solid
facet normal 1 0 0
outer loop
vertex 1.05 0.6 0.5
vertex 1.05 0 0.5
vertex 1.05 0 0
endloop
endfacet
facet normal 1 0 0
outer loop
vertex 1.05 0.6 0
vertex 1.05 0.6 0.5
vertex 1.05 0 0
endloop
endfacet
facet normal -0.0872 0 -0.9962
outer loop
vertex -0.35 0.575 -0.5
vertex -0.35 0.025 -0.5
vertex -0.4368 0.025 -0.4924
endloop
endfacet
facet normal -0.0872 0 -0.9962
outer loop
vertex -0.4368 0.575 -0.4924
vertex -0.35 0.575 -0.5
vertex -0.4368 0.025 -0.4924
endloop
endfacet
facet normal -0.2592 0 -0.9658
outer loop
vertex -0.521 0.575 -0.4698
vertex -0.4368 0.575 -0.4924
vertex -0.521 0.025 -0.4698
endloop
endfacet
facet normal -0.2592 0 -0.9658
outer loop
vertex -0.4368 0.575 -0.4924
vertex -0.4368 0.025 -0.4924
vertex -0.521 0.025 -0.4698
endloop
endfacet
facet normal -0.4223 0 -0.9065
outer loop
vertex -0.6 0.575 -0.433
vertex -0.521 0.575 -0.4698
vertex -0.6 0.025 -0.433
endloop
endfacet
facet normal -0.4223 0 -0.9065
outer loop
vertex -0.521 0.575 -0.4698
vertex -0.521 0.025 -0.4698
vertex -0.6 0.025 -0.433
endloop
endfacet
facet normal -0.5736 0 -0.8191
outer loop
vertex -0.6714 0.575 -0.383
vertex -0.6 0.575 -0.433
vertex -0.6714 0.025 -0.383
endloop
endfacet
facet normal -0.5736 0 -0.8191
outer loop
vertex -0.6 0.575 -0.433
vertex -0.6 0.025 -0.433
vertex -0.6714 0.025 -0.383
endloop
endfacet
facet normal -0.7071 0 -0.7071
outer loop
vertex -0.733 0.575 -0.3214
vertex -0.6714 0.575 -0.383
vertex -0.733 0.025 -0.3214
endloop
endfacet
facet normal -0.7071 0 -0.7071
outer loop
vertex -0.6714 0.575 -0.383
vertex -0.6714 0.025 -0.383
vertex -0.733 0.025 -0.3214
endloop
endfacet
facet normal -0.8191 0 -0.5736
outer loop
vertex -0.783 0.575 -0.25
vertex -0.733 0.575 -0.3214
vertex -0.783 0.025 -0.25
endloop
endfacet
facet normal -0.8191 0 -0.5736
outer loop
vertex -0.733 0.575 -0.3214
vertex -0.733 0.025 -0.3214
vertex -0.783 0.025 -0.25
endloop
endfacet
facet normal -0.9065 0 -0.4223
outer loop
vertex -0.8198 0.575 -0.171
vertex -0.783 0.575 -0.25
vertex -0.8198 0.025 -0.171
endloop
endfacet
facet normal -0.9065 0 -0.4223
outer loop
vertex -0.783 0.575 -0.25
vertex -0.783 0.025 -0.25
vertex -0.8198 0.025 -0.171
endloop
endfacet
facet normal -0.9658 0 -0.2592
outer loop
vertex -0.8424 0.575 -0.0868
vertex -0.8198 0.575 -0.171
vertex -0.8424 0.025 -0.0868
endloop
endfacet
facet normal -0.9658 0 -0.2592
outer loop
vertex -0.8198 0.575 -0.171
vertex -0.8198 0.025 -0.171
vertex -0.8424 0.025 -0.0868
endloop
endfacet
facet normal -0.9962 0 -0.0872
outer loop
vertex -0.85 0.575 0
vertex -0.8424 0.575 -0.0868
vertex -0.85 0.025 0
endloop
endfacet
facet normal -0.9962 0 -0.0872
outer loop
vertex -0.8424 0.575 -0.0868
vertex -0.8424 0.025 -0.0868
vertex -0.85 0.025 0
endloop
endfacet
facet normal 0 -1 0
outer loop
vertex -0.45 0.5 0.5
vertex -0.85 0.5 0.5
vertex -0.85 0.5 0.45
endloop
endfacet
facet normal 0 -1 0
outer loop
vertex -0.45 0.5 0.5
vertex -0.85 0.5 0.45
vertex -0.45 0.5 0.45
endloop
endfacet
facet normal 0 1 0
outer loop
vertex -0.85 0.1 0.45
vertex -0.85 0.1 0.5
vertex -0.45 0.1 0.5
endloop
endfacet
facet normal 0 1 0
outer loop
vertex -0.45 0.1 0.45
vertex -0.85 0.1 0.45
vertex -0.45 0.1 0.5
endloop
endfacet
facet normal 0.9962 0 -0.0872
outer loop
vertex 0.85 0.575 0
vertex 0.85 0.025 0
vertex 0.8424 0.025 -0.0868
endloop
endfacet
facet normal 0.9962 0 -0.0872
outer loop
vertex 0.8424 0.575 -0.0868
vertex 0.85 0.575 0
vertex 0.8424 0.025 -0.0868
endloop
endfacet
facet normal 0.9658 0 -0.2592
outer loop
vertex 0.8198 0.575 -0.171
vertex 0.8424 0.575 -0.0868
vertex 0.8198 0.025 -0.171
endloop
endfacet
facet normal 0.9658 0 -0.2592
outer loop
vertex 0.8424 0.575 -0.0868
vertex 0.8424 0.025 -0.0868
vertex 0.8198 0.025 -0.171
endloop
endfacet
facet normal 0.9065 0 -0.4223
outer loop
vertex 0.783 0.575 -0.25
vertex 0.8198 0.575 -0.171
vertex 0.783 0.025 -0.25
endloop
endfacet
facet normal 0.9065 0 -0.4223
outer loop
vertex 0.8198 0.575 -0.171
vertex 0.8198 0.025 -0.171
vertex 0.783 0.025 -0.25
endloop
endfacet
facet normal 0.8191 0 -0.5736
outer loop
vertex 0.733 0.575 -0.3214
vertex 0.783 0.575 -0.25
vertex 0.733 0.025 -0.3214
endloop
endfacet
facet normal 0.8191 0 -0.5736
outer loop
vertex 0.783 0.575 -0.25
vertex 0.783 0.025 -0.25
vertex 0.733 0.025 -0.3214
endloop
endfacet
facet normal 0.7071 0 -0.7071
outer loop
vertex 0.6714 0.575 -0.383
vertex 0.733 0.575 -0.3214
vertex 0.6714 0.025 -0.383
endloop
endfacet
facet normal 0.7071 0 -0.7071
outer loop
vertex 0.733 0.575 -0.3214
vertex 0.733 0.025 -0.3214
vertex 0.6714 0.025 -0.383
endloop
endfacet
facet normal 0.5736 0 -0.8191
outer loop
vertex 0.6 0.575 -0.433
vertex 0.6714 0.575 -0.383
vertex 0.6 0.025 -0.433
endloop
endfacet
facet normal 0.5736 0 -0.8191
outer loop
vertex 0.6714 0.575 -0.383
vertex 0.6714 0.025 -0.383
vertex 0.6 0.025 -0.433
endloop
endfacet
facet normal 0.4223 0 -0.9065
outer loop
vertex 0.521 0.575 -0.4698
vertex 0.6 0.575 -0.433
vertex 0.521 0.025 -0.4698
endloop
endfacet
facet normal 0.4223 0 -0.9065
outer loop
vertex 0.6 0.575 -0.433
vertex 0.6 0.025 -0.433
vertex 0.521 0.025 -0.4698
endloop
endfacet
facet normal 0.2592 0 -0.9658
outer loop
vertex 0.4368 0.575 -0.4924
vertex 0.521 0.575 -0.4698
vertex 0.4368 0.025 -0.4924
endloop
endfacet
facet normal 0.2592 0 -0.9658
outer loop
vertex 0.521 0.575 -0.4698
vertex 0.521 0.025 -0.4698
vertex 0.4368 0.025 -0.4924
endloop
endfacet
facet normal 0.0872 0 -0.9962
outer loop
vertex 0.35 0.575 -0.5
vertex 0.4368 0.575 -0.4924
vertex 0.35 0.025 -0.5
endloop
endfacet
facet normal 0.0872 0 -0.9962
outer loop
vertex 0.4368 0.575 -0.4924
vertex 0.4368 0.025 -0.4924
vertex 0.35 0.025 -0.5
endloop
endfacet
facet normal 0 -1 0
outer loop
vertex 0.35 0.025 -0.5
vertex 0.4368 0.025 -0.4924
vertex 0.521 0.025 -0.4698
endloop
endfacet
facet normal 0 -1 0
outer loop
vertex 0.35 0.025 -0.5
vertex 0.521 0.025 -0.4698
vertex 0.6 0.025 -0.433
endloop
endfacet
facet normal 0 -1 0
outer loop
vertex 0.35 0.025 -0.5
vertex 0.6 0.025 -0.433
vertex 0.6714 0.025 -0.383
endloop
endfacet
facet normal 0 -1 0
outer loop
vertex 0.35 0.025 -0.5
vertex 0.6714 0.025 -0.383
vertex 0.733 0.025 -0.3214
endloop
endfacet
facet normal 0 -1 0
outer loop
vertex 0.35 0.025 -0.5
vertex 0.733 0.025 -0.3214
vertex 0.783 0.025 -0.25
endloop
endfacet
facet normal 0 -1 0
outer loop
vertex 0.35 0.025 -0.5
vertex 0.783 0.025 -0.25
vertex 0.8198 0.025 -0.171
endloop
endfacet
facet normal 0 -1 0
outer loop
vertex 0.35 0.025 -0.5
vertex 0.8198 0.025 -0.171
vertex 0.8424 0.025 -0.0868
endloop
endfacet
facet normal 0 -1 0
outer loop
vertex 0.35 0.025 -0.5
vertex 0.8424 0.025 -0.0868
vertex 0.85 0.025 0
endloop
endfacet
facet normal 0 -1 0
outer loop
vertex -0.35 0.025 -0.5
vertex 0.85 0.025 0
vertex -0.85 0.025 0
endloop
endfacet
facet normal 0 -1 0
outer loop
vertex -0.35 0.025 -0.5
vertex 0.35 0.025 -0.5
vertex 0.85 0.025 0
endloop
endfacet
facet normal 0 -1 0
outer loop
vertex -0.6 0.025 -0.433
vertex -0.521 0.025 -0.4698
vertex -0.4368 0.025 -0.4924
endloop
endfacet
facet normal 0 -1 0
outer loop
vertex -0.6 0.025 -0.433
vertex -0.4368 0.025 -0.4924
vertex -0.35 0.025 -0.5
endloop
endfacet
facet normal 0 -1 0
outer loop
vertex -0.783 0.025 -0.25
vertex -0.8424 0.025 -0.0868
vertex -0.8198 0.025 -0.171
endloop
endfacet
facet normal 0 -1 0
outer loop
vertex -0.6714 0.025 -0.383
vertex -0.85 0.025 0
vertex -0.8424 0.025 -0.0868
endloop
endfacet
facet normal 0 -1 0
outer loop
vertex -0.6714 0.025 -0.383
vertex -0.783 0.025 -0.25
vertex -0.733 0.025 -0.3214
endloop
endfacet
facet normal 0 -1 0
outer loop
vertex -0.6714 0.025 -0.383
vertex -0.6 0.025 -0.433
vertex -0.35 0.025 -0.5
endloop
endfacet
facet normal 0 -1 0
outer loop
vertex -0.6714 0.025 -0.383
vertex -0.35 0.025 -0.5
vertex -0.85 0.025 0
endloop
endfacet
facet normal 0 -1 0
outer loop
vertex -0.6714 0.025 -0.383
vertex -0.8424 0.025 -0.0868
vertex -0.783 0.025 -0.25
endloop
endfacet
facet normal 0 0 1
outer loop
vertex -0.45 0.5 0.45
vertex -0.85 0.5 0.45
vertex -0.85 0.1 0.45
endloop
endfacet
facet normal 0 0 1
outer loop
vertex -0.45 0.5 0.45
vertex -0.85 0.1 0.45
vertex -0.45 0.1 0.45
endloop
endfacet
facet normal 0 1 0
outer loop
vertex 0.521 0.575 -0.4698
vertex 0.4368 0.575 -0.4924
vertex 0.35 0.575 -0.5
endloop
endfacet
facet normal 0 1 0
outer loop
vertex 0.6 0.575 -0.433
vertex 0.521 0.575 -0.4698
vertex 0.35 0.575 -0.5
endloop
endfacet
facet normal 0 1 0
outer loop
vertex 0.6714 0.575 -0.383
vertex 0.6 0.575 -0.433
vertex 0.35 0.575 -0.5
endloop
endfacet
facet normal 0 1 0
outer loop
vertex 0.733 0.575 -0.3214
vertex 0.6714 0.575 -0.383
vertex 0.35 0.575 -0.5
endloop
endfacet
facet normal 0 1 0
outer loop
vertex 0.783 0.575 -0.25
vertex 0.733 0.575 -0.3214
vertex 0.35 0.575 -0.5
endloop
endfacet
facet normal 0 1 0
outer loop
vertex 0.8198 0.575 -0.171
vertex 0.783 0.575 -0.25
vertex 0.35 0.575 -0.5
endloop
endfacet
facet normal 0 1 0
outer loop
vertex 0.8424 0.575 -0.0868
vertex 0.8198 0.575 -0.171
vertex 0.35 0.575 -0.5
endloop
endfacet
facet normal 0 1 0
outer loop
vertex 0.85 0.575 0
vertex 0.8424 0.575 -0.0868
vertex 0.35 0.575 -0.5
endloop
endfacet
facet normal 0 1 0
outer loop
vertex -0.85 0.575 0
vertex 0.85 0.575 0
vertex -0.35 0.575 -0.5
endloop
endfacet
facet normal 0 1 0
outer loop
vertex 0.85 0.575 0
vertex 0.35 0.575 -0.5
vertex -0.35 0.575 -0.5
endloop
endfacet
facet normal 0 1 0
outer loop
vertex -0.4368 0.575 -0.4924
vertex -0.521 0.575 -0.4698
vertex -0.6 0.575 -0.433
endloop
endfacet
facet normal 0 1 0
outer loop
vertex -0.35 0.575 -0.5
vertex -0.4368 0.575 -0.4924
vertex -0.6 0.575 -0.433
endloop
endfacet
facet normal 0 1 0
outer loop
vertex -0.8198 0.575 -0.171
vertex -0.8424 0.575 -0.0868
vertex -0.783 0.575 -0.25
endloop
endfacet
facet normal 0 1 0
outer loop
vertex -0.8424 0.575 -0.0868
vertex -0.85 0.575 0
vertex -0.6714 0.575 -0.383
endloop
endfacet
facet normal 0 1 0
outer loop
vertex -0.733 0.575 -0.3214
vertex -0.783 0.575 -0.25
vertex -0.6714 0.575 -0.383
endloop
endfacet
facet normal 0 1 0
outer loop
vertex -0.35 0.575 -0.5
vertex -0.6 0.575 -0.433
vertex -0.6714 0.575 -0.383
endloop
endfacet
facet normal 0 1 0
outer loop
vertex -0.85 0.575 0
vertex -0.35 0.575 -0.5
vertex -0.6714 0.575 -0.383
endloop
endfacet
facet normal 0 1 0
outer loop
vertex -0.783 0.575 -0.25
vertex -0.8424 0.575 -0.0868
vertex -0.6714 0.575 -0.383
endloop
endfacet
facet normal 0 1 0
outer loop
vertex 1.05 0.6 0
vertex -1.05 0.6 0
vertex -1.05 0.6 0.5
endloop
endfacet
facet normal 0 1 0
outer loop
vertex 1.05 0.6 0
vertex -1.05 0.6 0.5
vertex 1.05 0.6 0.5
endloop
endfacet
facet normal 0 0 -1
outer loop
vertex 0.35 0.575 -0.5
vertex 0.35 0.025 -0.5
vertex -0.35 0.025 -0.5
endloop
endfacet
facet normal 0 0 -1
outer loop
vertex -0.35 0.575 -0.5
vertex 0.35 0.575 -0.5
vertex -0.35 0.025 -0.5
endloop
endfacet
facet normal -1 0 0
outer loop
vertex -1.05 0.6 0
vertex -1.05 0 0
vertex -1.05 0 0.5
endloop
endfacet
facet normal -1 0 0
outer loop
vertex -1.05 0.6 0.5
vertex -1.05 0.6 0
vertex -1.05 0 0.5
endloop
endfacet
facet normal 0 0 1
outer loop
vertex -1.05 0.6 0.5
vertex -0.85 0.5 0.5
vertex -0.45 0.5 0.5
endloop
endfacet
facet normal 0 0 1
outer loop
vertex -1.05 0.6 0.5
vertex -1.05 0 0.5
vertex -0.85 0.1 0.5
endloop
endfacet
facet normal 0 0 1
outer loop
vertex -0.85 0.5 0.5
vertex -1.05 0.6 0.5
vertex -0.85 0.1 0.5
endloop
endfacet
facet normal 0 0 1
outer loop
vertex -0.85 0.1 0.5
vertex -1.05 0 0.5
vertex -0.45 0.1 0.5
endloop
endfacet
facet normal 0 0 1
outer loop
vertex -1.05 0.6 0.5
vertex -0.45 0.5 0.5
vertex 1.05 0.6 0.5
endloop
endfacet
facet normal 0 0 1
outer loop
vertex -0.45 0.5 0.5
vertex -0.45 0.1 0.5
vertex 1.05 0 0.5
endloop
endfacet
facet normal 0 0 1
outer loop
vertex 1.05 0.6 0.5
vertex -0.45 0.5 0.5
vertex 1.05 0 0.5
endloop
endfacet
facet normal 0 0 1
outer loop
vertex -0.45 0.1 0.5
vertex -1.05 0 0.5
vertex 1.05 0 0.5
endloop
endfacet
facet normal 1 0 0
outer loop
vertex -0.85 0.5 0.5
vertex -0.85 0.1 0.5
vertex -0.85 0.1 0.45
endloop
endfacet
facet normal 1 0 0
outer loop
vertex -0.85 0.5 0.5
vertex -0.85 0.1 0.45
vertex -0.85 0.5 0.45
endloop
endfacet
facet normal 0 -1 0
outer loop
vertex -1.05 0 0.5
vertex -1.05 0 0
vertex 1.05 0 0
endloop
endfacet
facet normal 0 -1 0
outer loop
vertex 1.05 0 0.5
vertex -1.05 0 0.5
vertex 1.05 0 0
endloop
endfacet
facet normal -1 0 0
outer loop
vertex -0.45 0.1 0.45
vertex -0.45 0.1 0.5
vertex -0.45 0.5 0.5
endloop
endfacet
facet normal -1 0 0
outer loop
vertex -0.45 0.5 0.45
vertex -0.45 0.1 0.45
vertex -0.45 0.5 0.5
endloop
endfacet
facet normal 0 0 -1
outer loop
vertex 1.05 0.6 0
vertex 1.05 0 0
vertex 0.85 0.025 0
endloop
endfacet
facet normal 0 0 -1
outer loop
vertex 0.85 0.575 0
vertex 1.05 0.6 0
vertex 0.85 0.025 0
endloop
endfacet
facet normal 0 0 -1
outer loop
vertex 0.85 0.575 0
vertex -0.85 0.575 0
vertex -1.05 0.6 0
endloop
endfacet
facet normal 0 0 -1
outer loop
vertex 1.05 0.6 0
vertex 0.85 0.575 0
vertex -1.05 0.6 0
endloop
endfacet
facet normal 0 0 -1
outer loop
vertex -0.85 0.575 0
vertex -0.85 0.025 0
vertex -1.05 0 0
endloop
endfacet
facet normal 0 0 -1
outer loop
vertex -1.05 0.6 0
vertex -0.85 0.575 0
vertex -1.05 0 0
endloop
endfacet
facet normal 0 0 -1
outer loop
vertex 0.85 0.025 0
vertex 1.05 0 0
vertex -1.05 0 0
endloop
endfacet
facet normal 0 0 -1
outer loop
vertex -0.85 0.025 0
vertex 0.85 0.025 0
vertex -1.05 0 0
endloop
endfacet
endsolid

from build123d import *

# Parameters (mm, degrees)
BOSS_EXTRUDE1_DEPTH = 0.6
SKETCH2_W           = 2.1
SKETCH2_H           = 0.025
CUT_EXTRUDE1_DEPTH  = 0.5
SKETCH3_W           = 0.4
SKETCH3_H           = 0.4
CUT_EXTRUDE2_DEPTH  = 0.05


with BuildPart() as part:
    # Sketch1 → Boss-Extrude1 (new body)
    with BuildSketch(Plane(origin=(0, 0, 0), x_dir=(1, 0, 0), z_dir=(0, 1, 0))):
        with BuildLine():
            Line((-1.05, -0.5), (1.05, -0.5))
            Line((1.05, -0.5), (1.05, 0))
            Line((1.05, 0), (0.85, 0))
            ThreePointArc((0.85, 0), (0.703553391, 0.353553391), (0.35, 0.5))
            Line((0.35, 0.5), (-0.35, 0.5))
            ThreePointArc((-0.35, 0.5), (-0.703553391, 0.353553391), (-0.85, 0))
            Line((-0.85, 0), (-1.05, 0))
            Line((-1.05, 0), (-1.05, -0.5))
        make_face()
    extrude(amount=BOSS_EXTRUDE1_DEPTH)

    # Sketch2 → Cut-Extrude1 (cut)
    with BuildSketch(Plane(origin=(0, 0, -0.5), x_dir=(-1, 0, 0), z_dir=(0, 0, -1))):
        with Locations((0, 0.5875)):
            Rectangle(SKETCH2_W, SKETCH2_H)
        with Locations((0, 0.0125)):
            Rectangle(SKETCH2_W, SKETCH2_H)
    extrude(amount=-CUT_EXTRUDE1_DEPTH, mode=Mode.SUBTRACT)

    # Sketch3 → Cut-Extrude2 (cut)
    with BuildSketch(Plane.XY.offset(0.5)):
        with Locations((-0.65, 0.3)):
            Rectangle(SKETCH3_W, SKETCH3_H)
    extrude(amount=-CUT_EXTRUDE2_DEPTH, mode=Mode.SUBTRACT)


solid = part.part
